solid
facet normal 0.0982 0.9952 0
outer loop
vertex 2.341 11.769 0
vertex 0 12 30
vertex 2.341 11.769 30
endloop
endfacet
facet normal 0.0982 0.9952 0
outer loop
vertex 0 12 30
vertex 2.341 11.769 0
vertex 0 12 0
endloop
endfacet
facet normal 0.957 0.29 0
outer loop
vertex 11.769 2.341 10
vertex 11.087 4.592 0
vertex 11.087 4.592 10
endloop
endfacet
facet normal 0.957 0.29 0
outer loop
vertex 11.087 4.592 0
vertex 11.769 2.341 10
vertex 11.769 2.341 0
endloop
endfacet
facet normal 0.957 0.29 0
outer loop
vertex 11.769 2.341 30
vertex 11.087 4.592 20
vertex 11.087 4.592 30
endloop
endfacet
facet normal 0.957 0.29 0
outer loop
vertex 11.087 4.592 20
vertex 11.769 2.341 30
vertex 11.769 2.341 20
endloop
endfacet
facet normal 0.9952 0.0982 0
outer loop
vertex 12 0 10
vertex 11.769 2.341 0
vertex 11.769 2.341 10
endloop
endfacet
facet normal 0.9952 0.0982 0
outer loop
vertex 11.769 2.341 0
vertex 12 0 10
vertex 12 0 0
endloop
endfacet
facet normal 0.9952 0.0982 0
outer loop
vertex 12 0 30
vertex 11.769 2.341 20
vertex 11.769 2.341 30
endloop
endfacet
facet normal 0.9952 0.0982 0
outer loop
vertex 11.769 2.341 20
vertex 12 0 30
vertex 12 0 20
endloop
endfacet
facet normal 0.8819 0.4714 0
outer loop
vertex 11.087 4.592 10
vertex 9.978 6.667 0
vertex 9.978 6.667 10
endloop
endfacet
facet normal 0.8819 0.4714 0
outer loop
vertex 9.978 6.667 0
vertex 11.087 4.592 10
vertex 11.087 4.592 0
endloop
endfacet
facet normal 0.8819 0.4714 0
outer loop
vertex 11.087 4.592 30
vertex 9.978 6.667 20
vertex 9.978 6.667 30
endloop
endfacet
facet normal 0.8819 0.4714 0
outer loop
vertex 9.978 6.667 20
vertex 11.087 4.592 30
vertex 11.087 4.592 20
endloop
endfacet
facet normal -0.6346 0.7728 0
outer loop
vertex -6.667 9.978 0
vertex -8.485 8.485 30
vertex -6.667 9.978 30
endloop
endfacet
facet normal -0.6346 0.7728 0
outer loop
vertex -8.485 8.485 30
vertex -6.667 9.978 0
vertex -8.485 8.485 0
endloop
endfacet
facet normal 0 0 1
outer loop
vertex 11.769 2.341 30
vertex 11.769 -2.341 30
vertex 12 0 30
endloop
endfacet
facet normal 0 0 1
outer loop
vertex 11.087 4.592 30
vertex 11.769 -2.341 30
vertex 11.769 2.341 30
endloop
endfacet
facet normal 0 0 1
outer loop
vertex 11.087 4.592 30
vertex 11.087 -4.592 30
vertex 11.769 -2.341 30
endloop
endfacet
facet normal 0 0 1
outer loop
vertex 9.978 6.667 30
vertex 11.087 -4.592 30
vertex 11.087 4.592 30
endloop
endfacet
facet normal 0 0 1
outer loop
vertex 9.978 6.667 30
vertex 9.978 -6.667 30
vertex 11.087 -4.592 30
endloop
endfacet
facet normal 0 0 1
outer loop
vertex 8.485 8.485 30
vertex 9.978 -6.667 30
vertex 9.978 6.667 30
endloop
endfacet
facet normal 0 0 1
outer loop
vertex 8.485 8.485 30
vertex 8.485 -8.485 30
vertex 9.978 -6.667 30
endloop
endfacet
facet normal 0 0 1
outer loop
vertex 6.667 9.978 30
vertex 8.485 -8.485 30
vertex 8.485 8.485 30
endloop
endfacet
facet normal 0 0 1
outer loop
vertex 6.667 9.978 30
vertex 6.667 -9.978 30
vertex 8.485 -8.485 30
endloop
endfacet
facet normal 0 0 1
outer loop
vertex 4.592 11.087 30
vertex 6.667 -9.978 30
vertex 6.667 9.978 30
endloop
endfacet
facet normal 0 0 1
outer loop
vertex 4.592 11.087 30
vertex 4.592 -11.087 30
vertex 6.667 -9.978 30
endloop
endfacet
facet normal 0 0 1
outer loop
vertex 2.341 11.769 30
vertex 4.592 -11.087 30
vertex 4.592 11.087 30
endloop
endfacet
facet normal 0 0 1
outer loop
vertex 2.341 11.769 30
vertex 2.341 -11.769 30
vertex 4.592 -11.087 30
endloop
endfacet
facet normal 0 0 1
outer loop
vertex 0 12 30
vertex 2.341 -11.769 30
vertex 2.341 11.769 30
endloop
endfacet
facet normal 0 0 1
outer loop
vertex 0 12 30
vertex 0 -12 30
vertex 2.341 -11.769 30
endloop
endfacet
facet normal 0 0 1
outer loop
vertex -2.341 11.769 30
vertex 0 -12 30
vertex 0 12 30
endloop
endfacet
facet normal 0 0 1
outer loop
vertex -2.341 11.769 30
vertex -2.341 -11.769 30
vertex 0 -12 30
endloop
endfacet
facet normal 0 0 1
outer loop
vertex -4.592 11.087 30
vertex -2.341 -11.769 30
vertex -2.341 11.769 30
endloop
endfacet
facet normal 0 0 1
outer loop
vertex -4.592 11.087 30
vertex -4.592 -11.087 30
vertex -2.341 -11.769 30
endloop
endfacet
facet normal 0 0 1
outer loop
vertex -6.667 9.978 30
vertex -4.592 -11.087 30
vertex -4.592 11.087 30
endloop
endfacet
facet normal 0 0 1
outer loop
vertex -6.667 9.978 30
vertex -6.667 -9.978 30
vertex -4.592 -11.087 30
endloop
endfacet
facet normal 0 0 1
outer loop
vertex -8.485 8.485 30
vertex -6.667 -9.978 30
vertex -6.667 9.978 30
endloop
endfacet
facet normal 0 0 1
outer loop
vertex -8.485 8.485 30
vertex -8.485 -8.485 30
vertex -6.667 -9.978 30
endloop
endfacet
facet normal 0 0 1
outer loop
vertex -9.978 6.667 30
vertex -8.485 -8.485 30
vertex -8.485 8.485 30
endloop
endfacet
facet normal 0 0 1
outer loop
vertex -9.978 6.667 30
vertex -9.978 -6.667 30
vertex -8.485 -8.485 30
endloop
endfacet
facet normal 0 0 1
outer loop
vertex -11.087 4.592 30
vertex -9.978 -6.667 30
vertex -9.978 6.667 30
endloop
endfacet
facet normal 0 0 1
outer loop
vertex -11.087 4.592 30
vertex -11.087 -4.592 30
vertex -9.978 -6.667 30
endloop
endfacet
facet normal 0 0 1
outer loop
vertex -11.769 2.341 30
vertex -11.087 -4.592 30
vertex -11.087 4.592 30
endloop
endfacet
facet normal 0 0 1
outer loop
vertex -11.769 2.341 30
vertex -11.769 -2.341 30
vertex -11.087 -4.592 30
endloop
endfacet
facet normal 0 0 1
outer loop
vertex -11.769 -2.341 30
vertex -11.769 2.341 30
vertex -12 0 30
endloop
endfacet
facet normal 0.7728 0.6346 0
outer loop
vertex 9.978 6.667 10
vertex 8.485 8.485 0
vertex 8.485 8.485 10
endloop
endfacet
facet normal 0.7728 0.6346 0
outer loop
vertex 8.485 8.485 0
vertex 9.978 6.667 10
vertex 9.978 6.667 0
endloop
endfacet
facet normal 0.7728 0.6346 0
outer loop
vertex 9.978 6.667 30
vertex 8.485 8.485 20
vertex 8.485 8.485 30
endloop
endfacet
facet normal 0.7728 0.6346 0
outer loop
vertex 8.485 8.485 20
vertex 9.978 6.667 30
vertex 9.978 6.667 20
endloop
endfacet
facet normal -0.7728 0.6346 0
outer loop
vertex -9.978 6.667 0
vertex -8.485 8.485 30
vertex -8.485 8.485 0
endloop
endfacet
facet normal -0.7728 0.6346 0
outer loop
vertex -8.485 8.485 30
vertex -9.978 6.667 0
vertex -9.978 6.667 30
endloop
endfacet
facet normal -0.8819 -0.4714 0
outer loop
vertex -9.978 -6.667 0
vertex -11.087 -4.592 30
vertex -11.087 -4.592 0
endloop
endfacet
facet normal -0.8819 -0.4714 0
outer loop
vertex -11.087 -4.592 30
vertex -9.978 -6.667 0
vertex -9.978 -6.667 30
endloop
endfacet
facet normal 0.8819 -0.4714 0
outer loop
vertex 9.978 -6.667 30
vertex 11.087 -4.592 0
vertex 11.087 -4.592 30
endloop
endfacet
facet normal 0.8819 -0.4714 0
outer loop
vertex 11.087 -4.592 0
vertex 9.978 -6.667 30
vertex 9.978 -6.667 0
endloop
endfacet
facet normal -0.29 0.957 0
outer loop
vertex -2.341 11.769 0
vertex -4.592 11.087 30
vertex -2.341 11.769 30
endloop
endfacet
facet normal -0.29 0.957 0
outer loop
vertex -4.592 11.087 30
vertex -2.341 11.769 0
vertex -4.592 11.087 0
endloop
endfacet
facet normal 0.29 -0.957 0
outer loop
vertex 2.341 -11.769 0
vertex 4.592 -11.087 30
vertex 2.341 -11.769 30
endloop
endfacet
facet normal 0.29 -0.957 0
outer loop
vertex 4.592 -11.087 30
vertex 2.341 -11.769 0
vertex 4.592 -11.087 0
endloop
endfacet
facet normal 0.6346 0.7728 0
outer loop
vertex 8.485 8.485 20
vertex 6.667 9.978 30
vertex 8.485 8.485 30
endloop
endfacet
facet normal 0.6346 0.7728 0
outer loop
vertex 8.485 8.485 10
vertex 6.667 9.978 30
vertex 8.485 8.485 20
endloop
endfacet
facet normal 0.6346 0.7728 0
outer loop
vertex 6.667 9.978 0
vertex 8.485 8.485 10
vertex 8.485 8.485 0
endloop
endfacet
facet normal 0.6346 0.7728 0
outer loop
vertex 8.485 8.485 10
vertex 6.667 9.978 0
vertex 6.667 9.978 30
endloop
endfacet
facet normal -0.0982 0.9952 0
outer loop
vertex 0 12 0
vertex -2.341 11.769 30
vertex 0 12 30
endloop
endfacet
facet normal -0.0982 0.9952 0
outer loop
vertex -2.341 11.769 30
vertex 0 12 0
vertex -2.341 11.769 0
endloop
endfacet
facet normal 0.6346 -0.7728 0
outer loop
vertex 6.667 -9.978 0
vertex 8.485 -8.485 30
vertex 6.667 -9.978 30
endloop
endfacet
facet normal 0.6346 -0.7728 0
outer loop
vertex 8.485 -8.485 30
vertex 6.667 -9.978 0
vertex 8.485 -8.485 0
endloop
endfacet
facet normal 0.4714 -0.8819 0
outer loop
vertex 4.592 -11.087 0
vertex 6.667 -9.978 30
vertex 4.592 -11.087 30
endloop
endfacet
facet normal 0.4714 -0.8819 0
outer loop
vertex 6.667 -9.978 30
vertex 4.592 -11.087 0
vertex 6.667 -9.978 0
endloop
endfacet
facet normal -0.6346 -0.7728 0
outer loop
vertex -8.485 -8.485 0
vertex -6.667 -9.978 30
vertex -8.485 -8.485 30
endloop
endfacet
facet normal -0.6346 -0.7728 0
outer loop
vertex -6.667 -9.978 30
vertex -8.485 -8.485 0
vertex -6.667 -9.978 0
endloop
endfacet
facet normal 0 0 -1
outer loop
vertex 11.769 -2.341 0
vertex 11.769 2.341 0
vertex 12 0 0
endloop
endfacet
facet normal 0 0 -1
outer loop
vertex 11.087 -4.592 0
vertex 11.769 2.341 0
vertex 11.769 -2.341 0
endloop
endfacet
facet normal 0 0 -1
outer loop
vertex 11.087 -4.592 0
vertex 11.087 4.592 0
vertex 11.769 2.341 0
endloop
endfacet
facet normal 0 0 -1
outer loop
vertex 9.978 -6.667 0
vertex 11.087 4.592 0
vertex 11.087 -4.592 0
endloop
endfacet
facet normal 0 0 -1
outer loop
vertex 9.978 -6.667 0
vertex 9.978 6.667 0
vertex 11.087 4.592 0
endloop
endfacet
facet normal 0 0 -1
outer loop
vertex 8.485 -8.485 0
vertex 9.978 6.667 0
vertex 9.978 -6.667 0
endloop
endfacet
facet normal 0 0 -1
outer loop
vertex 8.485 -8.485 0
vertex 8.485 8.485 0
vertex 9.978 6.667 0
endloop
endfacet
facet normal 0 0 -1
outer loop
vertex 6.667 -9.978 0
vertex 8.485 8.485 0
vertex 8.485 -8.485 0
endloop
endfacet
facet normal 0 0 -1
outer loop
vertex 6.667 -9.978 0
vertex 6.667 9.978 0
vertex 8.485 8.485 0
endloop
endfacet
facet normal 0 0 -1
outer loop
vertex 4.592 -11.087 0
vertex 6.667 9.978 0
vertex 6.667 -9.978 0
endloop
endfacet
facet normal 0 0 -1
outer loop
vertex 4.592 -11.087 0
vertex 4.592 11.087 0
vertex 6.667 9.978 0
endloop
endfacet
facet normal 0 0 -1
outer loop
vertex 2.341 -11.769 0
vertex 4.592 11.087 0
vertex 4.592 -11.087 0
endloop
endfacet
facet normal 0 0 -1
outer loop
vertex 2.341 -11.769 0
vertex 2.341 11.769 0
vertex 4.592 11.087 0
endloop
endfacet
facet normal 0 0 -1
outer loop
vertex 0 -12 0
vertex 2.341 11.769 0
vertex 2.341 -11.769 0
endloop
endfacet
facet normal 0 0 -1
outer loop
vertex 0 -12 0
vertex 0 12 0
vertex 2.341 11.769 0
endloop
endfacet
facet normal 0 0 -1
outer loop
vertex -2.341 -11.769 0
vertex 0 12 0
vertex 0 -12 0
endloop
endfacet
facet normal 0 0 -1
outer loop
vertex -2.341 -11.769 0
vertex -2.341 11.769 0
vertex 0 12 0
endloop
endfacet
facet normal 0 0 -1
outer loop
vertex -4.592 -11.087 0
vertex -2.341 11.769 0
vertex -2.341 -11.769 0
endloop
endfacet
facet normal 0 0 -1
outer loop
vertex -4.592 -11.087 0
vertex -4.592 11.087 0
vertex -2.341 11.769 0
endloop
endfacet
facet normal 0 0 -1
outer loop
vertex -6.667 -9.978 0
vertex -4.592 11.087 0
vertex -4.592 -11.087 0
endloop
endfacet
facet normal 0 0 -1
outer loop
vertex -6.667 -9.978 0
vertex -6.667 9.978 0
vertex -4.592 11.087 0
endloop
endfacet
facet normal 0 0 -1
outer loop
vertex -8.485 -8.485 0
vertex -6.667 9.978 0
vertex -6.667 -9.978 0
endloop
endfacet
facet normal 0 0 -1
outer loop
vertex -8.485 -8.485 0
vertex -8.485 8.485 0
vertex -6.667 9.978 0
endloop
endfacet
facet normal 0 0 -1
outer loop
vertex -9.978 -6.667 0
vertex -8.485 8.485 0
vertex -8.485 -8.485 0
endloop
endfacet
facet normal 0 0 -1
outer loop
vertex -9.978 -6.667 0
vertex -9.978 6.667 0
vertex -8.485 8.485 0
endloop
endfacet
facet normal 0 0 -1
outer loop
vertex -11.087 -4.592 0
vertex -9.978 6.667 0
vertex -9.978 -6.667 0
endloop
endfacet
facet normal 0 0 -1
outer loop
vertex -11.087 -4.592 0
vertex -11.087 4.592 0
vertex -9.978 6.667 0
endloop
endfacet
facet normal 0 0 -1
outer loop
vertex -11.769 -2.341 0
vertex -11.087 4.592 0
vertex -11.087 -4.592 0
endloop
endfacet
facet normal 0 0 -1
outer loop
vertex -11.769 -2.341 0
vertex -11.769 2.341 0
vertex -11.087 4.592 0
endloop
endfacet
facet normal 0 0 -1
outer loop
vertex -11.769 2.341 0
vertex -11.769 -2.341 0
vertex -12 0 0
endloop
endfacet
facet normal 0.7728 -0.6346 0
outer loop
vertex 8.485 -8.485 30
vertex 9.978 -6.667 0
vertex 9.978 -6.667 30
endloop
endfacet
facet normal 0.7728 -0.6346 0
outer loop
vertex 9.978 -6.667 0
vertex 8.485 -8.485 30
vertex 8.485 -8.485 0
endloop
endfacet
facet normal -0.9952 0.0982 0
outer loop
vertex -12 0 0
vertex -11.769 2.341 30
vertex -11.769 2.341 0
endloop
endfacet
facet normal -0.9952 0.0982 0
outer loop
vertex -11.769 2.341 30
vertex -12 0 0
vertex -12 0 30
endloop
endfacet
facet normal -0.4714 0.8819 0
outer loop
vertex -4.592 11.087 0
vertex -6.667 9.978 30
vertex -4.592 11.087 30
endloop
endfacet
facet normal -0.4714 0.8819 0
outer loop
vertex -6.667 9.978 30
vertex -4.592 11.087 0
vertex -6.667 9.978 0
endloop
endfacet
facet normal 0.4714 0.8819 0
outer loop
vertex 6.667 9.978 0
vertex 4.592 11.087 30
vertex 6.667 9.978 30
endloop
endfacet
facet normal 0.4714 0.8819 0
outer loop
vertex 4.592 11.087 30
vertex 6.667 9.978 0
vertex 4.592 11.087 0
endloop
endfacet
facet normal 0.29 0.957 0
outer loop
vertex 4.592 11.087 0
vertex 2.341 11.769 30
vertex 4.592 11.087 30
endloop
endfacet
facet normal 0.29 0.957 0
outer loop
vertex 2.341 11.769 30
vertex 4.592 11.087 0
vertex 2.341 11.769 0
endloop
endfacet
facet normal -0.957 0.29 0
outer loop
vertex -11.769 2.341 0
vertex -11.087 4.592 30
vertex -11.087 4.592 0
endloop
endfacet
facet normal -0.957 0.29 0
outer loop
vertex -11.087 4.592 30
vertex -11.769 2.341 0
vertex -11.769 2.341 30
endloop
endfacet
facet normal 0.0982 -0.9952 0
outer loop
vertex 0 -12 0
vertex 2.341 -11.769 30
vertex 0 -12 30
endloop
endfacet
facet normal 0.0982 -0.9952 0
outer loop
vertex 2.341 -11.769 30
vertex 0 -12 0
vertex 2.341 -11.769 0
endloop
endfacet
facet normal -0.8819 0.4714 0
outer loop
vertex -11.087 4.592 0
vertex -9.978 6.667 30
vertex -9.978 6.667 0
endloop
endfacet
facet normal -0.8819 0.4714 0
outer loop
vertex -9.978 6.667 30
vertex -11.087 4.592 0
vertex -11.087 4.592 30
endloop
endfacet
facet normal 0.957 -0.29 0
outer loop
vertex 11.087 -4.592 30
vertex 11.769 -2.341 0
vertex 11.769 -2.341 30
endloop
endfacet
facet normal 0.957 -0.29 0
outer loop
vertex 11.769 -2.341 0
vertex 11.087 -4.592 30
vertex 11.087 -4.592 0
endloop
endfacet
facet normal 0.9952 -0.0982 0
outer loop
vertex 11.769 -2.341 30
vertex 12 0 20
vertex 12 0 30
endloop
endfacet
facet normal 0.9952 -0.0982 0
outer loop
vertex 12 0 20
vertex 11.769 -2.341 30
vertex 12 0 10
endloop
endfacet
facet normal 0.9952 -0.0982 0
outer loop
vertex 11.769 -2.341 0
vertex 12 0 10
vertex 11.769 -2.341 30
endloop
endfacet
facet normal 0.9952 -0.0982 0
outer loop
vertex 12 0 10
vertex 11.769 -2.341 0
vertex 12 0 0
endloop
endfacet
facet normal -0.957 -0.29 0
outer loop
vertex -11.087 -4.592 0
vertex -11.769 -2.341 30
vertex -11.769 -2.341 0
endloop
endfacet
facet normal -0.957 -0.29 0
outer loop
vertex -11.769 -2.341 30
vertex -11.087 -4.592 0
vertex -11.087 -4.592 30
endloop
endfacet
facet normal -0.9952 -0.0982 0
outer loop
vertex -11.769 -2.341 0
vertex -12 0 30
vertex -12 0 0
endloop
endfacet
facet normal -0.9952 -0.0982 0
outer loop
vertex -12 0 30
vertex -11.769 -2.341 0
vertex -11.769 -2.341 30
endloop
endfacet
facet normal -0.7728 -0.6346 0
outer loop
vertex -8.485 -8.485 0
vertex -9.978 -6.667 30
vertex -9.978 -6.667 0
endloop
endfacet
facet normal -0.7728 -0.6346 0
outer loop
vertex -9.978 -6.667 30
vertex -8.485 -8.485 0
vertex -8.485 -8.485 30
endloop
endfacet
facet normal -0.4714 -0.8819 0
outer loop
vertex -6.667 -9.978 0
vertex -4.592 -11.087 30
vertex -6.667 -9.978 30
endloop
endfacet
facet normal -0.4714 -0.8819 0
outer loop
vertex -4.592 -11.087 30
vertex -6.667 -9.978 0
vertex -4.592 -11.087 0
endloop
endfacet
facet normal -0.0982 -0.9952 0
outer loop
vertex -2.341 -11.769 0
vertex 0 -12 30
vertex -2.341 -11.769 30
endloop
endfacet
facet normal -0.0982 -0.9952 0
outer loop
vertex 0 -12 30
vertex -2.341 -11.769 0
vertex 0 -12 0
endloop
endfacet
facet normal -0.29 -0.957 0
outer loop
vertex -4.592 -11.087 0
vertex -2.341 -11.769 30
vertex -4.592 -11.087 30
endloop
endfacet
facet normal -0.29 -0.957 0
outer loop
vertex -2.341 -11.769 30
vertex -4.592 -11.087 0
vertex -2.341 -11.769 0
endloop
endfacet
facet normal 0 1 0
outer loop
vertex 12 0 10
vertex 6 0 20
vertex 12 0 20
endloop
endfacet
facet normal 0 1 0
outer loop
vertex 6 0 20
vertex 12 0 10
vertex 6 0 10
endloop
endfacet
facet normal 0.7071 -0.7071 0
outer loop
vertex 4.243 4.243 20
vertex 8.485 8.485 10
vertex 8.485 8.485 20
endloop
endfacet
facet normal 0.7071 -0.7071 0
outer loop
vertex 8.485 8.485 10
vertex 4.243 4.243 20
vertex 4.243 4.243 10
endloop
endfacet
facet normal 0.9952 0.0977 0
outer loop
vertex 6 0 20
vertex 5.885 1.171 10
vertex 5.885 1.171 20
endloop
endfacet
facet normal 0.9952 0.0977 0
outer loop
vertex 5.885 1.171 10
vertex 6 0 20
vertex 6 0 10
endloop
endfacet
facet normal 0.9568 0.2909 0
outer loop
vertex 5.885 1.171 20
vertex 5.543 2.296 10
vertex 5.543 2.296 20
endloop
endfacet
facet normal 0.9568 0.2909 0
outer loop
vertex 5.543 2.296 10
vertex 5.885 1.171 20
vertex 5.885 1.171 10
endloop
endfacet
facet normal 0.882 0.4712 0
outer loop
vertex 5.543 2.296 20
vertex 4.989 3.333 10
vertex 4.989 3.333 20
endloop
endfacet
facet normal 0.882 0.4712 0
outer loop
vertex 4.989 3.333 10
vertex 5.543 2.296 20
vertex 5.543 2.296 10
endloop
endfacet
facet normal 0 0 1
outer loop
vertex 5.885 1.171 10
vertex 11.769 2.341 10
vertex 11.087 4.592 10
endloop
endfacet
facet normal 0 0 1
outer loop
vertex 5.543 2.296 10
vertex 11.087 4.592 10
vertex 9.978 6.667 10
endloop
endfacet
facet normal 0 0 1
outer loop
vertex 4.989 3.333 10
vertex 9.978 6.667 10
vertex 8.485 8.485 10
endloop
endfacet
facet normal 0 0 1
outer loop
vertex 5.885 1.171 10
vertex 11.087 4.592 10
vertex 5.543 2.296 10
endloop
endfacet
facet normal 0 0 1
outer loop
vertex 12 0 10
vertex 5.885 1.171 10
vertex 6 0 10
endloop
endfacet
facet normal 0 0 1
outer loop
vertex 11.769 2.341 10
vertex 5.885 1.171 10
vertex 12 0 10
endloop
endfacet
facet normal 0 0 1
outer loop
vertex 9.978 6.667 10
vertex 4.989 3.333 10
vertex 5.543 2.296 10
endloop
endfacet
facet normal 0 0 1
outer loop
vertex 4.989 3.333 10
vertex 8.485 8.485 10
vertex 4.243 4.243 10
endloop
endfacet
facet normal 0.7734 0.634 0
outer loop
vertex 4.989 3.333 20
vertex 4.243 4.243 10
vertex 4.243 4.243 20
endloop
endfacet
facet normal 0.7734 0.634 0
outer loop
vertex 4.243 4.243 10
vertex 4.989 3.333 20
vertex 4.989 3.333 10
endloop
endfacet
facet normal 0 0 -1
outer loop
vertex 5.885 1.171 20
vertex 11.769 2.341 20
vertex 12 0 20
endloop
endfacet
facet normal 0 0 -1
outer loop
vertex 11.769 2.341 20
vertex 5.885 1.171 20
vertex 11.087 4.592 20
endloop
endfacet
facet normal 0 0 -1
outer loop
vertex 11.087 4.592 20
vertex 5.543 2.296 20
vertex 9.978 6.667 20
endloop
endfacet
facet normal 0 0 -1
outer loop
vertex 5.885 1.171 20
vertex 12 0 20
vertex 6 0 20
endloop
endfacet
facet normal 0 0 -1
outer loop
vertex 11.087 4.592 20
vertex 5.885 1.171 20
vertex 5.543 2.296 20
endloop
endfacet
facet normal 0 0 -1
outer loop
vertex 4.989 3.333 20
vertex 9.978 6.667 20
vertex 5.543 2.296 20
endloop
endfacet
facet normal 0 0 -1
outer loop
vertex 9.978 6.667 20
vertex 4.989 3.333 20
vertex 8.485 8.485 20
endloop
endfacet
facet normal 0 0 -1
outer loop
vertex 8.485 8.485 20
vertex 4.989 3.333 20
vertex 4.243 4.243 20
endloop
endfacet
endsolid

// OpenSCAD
// A declared cylinder with a pocket cut along its own facet boundaries, whose
// volume the model fixes in closed form.
//
// **Registered WILL_FAIL from 2026-09-22 to 2026-09-24**, failing by 5.4398
// mm3, and that was the defect rather than the test being wrong; it passes on
// its own merits since, and the marking is gone - see the end of this comment.
// Read it beside `step-region-beyond-the-band.scad`, which guards the same
// surface's face count; this one states what the solid *is*.
//
// Why this shape, and every choice in it is load bearing. The pocket is cut
// with `rotate_extrude(angle = 45)`, so at $fn = 32 it takes 45/11.25 = 4
// segments and its two radial end faces are planes **through the axis**, which
// fall exactly on the wall's vertex columns at 0 and 45 degrees. That is the
// whole trick: a cut anywhere else puts its new vertices on a *chord* of the
// wall, up to the sagitta inside the true cylinder, and they are then not on
// the declared surface at all. Cutting along vertex columns leaves every new
// vertex at exactly r = 12, and the pocket's floor and ceiling at z = 10 and
// z = 20 add vertices on the *rulings*, which are also exactly on it.
//
// So the wall ends up as 26 full-height facets plus 8 short ones above and
// below the pocket, every one of them exactly on the declared cylinder, and the
// short ones in nobody's band - a band is a ring between two rims and these are
// not in that ring. The region a declaration covers is larger than the form
// that writes it. See doc/step-rungs.md, R0.
//
// **The volume is derived, and it is elementary.** The solid is a cylinder less
// an annular sector: the pocket removes 6 <= r <= 12 over 45 degrees and 10 <=
// z <= 20, and nothing else touches the body.
//
//     cylinder     pi * 12^2 * 30                    = 4320 pi
//     pocket       (45/360) * pi * (12^2 - 6^2) * 10 =  135 pi
//     solid        4320 pi - 135 pi = 4185 pi        = 13147.565255
//
// That figure is the model's arithmetic and owes nothing to the tessellation -
// which is the point, because a number taken off the faceted input would be
// wrong however carefully it were taken. It is reachable only if **both**
// declared cylinders are written whole: the wall at r = 12 and the pocket's
// inner face at r = 6. The outer r = 20 is entirely outside the body and
// contributes no face.
// VOLUME: 13147.565255
//
// And the declaration channel is pinned beside it, because a volume that is
// wrong for want of a *declaration* is a different defect from one that is
// wrong for want of a claim, and this fixture is about the second. Three
// cylinders: the wall at r = 12 and the pocket's two walls at r = 6 and r = 20.
// EXPECT: 3 analytic surfaces available (3 cylindrical, 0 spherical, 0 toroidal, 0 Bezier)
//
// Measured 2026-09-22, both tiers export **13142.125430** - short by 5.4398,
// 4.1e-4 - because part of each declared cylinder is written as chord planes
// which sit inside the surface they stand for. The exporter reads back as
// Cylinder 4, Plane 8.
//
// And it is not a hypothesis that claiming the region whole fixes it. The
// parked attempt on `claude/step-region-r0-optimistic-parked` gives up the band
// and lets the trimmed-quadric pass cover the region; on this model its exact
// tier exports **13147.565255**, the derived figure to 2.8e-8 relative, as
// Cylinder 3, Plane 6 with 74 exact circles instead of 8. That attempt was
// reverted for surrendering a closed form elsewhere - see
// doc/step-recognition-design.md, *R0, attempted and reverted* - so the number
// here stays wrong until R0 is done properly. The day it is, ctest reports this
// as a failure, which is how the fix announces itself.
//
// **It announced itself on 2026-09-24**, and not through the band at all. The 8
// short facets are D0 ground: their maker declared the cylinder and every one
// of their corners is on it at machine precision. What left them planar were the
// trimmed-quadric pass's region rules - a floor of three facets, a median span -
// which are statistics over the tessellation, and a D4 rule may not decide D0
// ground (doc/step-rungs.md). Once those rules decide only the facets the band
// admitted, both tiers export 13147.565255, the derived figure, and the round
// trip reads Cylinder 6, Plane 6, with 12 exact circles. The wall is still two
// kinds of face - the band's ring and the remainder as quadric patches - which is
// R0's representation question and no longer a question of what the solid is.
//
// Known systemic defect: the D0 regions report (recognition::reportRegions)
// finds this model's declared surface written as a band's ring plus a quadric
// patch - a boundary the model does not have. R0, region first:
// doc/step-recognition-design.md, *R0 is region first, and the region is
// sequence-agnostic*. Tolerated by name until it lands; the test fails the
// day it is no longer raised.
// KNOWN-EXPORT-ERROR: split on a boundary the model does not have
//
// Every EXPORT-WARNING this fixture raises, named, each with why it is known;
// any other fails the test, and so does a named one no run raises any more.
//
// One declared surface written partly by one recogniser and partly by
// another, the division decided by pass order - the split surface of open
// item 26, which R0 (item 29) has not reached here.
// KNOWN-EXPORT-WARNING: split between different kinds of recogniser
// KNOWN-EXPORT-WARNING: so this is one connected region cut in two by pass order
$fn = 32;
difference() {
  cylinder(h = 30, r = 12);
  translate([0, 0, 10]) rotate_extrude(angle = 45) polygon([[6,0],[20,0],[20,10],[6,10]]);
}
